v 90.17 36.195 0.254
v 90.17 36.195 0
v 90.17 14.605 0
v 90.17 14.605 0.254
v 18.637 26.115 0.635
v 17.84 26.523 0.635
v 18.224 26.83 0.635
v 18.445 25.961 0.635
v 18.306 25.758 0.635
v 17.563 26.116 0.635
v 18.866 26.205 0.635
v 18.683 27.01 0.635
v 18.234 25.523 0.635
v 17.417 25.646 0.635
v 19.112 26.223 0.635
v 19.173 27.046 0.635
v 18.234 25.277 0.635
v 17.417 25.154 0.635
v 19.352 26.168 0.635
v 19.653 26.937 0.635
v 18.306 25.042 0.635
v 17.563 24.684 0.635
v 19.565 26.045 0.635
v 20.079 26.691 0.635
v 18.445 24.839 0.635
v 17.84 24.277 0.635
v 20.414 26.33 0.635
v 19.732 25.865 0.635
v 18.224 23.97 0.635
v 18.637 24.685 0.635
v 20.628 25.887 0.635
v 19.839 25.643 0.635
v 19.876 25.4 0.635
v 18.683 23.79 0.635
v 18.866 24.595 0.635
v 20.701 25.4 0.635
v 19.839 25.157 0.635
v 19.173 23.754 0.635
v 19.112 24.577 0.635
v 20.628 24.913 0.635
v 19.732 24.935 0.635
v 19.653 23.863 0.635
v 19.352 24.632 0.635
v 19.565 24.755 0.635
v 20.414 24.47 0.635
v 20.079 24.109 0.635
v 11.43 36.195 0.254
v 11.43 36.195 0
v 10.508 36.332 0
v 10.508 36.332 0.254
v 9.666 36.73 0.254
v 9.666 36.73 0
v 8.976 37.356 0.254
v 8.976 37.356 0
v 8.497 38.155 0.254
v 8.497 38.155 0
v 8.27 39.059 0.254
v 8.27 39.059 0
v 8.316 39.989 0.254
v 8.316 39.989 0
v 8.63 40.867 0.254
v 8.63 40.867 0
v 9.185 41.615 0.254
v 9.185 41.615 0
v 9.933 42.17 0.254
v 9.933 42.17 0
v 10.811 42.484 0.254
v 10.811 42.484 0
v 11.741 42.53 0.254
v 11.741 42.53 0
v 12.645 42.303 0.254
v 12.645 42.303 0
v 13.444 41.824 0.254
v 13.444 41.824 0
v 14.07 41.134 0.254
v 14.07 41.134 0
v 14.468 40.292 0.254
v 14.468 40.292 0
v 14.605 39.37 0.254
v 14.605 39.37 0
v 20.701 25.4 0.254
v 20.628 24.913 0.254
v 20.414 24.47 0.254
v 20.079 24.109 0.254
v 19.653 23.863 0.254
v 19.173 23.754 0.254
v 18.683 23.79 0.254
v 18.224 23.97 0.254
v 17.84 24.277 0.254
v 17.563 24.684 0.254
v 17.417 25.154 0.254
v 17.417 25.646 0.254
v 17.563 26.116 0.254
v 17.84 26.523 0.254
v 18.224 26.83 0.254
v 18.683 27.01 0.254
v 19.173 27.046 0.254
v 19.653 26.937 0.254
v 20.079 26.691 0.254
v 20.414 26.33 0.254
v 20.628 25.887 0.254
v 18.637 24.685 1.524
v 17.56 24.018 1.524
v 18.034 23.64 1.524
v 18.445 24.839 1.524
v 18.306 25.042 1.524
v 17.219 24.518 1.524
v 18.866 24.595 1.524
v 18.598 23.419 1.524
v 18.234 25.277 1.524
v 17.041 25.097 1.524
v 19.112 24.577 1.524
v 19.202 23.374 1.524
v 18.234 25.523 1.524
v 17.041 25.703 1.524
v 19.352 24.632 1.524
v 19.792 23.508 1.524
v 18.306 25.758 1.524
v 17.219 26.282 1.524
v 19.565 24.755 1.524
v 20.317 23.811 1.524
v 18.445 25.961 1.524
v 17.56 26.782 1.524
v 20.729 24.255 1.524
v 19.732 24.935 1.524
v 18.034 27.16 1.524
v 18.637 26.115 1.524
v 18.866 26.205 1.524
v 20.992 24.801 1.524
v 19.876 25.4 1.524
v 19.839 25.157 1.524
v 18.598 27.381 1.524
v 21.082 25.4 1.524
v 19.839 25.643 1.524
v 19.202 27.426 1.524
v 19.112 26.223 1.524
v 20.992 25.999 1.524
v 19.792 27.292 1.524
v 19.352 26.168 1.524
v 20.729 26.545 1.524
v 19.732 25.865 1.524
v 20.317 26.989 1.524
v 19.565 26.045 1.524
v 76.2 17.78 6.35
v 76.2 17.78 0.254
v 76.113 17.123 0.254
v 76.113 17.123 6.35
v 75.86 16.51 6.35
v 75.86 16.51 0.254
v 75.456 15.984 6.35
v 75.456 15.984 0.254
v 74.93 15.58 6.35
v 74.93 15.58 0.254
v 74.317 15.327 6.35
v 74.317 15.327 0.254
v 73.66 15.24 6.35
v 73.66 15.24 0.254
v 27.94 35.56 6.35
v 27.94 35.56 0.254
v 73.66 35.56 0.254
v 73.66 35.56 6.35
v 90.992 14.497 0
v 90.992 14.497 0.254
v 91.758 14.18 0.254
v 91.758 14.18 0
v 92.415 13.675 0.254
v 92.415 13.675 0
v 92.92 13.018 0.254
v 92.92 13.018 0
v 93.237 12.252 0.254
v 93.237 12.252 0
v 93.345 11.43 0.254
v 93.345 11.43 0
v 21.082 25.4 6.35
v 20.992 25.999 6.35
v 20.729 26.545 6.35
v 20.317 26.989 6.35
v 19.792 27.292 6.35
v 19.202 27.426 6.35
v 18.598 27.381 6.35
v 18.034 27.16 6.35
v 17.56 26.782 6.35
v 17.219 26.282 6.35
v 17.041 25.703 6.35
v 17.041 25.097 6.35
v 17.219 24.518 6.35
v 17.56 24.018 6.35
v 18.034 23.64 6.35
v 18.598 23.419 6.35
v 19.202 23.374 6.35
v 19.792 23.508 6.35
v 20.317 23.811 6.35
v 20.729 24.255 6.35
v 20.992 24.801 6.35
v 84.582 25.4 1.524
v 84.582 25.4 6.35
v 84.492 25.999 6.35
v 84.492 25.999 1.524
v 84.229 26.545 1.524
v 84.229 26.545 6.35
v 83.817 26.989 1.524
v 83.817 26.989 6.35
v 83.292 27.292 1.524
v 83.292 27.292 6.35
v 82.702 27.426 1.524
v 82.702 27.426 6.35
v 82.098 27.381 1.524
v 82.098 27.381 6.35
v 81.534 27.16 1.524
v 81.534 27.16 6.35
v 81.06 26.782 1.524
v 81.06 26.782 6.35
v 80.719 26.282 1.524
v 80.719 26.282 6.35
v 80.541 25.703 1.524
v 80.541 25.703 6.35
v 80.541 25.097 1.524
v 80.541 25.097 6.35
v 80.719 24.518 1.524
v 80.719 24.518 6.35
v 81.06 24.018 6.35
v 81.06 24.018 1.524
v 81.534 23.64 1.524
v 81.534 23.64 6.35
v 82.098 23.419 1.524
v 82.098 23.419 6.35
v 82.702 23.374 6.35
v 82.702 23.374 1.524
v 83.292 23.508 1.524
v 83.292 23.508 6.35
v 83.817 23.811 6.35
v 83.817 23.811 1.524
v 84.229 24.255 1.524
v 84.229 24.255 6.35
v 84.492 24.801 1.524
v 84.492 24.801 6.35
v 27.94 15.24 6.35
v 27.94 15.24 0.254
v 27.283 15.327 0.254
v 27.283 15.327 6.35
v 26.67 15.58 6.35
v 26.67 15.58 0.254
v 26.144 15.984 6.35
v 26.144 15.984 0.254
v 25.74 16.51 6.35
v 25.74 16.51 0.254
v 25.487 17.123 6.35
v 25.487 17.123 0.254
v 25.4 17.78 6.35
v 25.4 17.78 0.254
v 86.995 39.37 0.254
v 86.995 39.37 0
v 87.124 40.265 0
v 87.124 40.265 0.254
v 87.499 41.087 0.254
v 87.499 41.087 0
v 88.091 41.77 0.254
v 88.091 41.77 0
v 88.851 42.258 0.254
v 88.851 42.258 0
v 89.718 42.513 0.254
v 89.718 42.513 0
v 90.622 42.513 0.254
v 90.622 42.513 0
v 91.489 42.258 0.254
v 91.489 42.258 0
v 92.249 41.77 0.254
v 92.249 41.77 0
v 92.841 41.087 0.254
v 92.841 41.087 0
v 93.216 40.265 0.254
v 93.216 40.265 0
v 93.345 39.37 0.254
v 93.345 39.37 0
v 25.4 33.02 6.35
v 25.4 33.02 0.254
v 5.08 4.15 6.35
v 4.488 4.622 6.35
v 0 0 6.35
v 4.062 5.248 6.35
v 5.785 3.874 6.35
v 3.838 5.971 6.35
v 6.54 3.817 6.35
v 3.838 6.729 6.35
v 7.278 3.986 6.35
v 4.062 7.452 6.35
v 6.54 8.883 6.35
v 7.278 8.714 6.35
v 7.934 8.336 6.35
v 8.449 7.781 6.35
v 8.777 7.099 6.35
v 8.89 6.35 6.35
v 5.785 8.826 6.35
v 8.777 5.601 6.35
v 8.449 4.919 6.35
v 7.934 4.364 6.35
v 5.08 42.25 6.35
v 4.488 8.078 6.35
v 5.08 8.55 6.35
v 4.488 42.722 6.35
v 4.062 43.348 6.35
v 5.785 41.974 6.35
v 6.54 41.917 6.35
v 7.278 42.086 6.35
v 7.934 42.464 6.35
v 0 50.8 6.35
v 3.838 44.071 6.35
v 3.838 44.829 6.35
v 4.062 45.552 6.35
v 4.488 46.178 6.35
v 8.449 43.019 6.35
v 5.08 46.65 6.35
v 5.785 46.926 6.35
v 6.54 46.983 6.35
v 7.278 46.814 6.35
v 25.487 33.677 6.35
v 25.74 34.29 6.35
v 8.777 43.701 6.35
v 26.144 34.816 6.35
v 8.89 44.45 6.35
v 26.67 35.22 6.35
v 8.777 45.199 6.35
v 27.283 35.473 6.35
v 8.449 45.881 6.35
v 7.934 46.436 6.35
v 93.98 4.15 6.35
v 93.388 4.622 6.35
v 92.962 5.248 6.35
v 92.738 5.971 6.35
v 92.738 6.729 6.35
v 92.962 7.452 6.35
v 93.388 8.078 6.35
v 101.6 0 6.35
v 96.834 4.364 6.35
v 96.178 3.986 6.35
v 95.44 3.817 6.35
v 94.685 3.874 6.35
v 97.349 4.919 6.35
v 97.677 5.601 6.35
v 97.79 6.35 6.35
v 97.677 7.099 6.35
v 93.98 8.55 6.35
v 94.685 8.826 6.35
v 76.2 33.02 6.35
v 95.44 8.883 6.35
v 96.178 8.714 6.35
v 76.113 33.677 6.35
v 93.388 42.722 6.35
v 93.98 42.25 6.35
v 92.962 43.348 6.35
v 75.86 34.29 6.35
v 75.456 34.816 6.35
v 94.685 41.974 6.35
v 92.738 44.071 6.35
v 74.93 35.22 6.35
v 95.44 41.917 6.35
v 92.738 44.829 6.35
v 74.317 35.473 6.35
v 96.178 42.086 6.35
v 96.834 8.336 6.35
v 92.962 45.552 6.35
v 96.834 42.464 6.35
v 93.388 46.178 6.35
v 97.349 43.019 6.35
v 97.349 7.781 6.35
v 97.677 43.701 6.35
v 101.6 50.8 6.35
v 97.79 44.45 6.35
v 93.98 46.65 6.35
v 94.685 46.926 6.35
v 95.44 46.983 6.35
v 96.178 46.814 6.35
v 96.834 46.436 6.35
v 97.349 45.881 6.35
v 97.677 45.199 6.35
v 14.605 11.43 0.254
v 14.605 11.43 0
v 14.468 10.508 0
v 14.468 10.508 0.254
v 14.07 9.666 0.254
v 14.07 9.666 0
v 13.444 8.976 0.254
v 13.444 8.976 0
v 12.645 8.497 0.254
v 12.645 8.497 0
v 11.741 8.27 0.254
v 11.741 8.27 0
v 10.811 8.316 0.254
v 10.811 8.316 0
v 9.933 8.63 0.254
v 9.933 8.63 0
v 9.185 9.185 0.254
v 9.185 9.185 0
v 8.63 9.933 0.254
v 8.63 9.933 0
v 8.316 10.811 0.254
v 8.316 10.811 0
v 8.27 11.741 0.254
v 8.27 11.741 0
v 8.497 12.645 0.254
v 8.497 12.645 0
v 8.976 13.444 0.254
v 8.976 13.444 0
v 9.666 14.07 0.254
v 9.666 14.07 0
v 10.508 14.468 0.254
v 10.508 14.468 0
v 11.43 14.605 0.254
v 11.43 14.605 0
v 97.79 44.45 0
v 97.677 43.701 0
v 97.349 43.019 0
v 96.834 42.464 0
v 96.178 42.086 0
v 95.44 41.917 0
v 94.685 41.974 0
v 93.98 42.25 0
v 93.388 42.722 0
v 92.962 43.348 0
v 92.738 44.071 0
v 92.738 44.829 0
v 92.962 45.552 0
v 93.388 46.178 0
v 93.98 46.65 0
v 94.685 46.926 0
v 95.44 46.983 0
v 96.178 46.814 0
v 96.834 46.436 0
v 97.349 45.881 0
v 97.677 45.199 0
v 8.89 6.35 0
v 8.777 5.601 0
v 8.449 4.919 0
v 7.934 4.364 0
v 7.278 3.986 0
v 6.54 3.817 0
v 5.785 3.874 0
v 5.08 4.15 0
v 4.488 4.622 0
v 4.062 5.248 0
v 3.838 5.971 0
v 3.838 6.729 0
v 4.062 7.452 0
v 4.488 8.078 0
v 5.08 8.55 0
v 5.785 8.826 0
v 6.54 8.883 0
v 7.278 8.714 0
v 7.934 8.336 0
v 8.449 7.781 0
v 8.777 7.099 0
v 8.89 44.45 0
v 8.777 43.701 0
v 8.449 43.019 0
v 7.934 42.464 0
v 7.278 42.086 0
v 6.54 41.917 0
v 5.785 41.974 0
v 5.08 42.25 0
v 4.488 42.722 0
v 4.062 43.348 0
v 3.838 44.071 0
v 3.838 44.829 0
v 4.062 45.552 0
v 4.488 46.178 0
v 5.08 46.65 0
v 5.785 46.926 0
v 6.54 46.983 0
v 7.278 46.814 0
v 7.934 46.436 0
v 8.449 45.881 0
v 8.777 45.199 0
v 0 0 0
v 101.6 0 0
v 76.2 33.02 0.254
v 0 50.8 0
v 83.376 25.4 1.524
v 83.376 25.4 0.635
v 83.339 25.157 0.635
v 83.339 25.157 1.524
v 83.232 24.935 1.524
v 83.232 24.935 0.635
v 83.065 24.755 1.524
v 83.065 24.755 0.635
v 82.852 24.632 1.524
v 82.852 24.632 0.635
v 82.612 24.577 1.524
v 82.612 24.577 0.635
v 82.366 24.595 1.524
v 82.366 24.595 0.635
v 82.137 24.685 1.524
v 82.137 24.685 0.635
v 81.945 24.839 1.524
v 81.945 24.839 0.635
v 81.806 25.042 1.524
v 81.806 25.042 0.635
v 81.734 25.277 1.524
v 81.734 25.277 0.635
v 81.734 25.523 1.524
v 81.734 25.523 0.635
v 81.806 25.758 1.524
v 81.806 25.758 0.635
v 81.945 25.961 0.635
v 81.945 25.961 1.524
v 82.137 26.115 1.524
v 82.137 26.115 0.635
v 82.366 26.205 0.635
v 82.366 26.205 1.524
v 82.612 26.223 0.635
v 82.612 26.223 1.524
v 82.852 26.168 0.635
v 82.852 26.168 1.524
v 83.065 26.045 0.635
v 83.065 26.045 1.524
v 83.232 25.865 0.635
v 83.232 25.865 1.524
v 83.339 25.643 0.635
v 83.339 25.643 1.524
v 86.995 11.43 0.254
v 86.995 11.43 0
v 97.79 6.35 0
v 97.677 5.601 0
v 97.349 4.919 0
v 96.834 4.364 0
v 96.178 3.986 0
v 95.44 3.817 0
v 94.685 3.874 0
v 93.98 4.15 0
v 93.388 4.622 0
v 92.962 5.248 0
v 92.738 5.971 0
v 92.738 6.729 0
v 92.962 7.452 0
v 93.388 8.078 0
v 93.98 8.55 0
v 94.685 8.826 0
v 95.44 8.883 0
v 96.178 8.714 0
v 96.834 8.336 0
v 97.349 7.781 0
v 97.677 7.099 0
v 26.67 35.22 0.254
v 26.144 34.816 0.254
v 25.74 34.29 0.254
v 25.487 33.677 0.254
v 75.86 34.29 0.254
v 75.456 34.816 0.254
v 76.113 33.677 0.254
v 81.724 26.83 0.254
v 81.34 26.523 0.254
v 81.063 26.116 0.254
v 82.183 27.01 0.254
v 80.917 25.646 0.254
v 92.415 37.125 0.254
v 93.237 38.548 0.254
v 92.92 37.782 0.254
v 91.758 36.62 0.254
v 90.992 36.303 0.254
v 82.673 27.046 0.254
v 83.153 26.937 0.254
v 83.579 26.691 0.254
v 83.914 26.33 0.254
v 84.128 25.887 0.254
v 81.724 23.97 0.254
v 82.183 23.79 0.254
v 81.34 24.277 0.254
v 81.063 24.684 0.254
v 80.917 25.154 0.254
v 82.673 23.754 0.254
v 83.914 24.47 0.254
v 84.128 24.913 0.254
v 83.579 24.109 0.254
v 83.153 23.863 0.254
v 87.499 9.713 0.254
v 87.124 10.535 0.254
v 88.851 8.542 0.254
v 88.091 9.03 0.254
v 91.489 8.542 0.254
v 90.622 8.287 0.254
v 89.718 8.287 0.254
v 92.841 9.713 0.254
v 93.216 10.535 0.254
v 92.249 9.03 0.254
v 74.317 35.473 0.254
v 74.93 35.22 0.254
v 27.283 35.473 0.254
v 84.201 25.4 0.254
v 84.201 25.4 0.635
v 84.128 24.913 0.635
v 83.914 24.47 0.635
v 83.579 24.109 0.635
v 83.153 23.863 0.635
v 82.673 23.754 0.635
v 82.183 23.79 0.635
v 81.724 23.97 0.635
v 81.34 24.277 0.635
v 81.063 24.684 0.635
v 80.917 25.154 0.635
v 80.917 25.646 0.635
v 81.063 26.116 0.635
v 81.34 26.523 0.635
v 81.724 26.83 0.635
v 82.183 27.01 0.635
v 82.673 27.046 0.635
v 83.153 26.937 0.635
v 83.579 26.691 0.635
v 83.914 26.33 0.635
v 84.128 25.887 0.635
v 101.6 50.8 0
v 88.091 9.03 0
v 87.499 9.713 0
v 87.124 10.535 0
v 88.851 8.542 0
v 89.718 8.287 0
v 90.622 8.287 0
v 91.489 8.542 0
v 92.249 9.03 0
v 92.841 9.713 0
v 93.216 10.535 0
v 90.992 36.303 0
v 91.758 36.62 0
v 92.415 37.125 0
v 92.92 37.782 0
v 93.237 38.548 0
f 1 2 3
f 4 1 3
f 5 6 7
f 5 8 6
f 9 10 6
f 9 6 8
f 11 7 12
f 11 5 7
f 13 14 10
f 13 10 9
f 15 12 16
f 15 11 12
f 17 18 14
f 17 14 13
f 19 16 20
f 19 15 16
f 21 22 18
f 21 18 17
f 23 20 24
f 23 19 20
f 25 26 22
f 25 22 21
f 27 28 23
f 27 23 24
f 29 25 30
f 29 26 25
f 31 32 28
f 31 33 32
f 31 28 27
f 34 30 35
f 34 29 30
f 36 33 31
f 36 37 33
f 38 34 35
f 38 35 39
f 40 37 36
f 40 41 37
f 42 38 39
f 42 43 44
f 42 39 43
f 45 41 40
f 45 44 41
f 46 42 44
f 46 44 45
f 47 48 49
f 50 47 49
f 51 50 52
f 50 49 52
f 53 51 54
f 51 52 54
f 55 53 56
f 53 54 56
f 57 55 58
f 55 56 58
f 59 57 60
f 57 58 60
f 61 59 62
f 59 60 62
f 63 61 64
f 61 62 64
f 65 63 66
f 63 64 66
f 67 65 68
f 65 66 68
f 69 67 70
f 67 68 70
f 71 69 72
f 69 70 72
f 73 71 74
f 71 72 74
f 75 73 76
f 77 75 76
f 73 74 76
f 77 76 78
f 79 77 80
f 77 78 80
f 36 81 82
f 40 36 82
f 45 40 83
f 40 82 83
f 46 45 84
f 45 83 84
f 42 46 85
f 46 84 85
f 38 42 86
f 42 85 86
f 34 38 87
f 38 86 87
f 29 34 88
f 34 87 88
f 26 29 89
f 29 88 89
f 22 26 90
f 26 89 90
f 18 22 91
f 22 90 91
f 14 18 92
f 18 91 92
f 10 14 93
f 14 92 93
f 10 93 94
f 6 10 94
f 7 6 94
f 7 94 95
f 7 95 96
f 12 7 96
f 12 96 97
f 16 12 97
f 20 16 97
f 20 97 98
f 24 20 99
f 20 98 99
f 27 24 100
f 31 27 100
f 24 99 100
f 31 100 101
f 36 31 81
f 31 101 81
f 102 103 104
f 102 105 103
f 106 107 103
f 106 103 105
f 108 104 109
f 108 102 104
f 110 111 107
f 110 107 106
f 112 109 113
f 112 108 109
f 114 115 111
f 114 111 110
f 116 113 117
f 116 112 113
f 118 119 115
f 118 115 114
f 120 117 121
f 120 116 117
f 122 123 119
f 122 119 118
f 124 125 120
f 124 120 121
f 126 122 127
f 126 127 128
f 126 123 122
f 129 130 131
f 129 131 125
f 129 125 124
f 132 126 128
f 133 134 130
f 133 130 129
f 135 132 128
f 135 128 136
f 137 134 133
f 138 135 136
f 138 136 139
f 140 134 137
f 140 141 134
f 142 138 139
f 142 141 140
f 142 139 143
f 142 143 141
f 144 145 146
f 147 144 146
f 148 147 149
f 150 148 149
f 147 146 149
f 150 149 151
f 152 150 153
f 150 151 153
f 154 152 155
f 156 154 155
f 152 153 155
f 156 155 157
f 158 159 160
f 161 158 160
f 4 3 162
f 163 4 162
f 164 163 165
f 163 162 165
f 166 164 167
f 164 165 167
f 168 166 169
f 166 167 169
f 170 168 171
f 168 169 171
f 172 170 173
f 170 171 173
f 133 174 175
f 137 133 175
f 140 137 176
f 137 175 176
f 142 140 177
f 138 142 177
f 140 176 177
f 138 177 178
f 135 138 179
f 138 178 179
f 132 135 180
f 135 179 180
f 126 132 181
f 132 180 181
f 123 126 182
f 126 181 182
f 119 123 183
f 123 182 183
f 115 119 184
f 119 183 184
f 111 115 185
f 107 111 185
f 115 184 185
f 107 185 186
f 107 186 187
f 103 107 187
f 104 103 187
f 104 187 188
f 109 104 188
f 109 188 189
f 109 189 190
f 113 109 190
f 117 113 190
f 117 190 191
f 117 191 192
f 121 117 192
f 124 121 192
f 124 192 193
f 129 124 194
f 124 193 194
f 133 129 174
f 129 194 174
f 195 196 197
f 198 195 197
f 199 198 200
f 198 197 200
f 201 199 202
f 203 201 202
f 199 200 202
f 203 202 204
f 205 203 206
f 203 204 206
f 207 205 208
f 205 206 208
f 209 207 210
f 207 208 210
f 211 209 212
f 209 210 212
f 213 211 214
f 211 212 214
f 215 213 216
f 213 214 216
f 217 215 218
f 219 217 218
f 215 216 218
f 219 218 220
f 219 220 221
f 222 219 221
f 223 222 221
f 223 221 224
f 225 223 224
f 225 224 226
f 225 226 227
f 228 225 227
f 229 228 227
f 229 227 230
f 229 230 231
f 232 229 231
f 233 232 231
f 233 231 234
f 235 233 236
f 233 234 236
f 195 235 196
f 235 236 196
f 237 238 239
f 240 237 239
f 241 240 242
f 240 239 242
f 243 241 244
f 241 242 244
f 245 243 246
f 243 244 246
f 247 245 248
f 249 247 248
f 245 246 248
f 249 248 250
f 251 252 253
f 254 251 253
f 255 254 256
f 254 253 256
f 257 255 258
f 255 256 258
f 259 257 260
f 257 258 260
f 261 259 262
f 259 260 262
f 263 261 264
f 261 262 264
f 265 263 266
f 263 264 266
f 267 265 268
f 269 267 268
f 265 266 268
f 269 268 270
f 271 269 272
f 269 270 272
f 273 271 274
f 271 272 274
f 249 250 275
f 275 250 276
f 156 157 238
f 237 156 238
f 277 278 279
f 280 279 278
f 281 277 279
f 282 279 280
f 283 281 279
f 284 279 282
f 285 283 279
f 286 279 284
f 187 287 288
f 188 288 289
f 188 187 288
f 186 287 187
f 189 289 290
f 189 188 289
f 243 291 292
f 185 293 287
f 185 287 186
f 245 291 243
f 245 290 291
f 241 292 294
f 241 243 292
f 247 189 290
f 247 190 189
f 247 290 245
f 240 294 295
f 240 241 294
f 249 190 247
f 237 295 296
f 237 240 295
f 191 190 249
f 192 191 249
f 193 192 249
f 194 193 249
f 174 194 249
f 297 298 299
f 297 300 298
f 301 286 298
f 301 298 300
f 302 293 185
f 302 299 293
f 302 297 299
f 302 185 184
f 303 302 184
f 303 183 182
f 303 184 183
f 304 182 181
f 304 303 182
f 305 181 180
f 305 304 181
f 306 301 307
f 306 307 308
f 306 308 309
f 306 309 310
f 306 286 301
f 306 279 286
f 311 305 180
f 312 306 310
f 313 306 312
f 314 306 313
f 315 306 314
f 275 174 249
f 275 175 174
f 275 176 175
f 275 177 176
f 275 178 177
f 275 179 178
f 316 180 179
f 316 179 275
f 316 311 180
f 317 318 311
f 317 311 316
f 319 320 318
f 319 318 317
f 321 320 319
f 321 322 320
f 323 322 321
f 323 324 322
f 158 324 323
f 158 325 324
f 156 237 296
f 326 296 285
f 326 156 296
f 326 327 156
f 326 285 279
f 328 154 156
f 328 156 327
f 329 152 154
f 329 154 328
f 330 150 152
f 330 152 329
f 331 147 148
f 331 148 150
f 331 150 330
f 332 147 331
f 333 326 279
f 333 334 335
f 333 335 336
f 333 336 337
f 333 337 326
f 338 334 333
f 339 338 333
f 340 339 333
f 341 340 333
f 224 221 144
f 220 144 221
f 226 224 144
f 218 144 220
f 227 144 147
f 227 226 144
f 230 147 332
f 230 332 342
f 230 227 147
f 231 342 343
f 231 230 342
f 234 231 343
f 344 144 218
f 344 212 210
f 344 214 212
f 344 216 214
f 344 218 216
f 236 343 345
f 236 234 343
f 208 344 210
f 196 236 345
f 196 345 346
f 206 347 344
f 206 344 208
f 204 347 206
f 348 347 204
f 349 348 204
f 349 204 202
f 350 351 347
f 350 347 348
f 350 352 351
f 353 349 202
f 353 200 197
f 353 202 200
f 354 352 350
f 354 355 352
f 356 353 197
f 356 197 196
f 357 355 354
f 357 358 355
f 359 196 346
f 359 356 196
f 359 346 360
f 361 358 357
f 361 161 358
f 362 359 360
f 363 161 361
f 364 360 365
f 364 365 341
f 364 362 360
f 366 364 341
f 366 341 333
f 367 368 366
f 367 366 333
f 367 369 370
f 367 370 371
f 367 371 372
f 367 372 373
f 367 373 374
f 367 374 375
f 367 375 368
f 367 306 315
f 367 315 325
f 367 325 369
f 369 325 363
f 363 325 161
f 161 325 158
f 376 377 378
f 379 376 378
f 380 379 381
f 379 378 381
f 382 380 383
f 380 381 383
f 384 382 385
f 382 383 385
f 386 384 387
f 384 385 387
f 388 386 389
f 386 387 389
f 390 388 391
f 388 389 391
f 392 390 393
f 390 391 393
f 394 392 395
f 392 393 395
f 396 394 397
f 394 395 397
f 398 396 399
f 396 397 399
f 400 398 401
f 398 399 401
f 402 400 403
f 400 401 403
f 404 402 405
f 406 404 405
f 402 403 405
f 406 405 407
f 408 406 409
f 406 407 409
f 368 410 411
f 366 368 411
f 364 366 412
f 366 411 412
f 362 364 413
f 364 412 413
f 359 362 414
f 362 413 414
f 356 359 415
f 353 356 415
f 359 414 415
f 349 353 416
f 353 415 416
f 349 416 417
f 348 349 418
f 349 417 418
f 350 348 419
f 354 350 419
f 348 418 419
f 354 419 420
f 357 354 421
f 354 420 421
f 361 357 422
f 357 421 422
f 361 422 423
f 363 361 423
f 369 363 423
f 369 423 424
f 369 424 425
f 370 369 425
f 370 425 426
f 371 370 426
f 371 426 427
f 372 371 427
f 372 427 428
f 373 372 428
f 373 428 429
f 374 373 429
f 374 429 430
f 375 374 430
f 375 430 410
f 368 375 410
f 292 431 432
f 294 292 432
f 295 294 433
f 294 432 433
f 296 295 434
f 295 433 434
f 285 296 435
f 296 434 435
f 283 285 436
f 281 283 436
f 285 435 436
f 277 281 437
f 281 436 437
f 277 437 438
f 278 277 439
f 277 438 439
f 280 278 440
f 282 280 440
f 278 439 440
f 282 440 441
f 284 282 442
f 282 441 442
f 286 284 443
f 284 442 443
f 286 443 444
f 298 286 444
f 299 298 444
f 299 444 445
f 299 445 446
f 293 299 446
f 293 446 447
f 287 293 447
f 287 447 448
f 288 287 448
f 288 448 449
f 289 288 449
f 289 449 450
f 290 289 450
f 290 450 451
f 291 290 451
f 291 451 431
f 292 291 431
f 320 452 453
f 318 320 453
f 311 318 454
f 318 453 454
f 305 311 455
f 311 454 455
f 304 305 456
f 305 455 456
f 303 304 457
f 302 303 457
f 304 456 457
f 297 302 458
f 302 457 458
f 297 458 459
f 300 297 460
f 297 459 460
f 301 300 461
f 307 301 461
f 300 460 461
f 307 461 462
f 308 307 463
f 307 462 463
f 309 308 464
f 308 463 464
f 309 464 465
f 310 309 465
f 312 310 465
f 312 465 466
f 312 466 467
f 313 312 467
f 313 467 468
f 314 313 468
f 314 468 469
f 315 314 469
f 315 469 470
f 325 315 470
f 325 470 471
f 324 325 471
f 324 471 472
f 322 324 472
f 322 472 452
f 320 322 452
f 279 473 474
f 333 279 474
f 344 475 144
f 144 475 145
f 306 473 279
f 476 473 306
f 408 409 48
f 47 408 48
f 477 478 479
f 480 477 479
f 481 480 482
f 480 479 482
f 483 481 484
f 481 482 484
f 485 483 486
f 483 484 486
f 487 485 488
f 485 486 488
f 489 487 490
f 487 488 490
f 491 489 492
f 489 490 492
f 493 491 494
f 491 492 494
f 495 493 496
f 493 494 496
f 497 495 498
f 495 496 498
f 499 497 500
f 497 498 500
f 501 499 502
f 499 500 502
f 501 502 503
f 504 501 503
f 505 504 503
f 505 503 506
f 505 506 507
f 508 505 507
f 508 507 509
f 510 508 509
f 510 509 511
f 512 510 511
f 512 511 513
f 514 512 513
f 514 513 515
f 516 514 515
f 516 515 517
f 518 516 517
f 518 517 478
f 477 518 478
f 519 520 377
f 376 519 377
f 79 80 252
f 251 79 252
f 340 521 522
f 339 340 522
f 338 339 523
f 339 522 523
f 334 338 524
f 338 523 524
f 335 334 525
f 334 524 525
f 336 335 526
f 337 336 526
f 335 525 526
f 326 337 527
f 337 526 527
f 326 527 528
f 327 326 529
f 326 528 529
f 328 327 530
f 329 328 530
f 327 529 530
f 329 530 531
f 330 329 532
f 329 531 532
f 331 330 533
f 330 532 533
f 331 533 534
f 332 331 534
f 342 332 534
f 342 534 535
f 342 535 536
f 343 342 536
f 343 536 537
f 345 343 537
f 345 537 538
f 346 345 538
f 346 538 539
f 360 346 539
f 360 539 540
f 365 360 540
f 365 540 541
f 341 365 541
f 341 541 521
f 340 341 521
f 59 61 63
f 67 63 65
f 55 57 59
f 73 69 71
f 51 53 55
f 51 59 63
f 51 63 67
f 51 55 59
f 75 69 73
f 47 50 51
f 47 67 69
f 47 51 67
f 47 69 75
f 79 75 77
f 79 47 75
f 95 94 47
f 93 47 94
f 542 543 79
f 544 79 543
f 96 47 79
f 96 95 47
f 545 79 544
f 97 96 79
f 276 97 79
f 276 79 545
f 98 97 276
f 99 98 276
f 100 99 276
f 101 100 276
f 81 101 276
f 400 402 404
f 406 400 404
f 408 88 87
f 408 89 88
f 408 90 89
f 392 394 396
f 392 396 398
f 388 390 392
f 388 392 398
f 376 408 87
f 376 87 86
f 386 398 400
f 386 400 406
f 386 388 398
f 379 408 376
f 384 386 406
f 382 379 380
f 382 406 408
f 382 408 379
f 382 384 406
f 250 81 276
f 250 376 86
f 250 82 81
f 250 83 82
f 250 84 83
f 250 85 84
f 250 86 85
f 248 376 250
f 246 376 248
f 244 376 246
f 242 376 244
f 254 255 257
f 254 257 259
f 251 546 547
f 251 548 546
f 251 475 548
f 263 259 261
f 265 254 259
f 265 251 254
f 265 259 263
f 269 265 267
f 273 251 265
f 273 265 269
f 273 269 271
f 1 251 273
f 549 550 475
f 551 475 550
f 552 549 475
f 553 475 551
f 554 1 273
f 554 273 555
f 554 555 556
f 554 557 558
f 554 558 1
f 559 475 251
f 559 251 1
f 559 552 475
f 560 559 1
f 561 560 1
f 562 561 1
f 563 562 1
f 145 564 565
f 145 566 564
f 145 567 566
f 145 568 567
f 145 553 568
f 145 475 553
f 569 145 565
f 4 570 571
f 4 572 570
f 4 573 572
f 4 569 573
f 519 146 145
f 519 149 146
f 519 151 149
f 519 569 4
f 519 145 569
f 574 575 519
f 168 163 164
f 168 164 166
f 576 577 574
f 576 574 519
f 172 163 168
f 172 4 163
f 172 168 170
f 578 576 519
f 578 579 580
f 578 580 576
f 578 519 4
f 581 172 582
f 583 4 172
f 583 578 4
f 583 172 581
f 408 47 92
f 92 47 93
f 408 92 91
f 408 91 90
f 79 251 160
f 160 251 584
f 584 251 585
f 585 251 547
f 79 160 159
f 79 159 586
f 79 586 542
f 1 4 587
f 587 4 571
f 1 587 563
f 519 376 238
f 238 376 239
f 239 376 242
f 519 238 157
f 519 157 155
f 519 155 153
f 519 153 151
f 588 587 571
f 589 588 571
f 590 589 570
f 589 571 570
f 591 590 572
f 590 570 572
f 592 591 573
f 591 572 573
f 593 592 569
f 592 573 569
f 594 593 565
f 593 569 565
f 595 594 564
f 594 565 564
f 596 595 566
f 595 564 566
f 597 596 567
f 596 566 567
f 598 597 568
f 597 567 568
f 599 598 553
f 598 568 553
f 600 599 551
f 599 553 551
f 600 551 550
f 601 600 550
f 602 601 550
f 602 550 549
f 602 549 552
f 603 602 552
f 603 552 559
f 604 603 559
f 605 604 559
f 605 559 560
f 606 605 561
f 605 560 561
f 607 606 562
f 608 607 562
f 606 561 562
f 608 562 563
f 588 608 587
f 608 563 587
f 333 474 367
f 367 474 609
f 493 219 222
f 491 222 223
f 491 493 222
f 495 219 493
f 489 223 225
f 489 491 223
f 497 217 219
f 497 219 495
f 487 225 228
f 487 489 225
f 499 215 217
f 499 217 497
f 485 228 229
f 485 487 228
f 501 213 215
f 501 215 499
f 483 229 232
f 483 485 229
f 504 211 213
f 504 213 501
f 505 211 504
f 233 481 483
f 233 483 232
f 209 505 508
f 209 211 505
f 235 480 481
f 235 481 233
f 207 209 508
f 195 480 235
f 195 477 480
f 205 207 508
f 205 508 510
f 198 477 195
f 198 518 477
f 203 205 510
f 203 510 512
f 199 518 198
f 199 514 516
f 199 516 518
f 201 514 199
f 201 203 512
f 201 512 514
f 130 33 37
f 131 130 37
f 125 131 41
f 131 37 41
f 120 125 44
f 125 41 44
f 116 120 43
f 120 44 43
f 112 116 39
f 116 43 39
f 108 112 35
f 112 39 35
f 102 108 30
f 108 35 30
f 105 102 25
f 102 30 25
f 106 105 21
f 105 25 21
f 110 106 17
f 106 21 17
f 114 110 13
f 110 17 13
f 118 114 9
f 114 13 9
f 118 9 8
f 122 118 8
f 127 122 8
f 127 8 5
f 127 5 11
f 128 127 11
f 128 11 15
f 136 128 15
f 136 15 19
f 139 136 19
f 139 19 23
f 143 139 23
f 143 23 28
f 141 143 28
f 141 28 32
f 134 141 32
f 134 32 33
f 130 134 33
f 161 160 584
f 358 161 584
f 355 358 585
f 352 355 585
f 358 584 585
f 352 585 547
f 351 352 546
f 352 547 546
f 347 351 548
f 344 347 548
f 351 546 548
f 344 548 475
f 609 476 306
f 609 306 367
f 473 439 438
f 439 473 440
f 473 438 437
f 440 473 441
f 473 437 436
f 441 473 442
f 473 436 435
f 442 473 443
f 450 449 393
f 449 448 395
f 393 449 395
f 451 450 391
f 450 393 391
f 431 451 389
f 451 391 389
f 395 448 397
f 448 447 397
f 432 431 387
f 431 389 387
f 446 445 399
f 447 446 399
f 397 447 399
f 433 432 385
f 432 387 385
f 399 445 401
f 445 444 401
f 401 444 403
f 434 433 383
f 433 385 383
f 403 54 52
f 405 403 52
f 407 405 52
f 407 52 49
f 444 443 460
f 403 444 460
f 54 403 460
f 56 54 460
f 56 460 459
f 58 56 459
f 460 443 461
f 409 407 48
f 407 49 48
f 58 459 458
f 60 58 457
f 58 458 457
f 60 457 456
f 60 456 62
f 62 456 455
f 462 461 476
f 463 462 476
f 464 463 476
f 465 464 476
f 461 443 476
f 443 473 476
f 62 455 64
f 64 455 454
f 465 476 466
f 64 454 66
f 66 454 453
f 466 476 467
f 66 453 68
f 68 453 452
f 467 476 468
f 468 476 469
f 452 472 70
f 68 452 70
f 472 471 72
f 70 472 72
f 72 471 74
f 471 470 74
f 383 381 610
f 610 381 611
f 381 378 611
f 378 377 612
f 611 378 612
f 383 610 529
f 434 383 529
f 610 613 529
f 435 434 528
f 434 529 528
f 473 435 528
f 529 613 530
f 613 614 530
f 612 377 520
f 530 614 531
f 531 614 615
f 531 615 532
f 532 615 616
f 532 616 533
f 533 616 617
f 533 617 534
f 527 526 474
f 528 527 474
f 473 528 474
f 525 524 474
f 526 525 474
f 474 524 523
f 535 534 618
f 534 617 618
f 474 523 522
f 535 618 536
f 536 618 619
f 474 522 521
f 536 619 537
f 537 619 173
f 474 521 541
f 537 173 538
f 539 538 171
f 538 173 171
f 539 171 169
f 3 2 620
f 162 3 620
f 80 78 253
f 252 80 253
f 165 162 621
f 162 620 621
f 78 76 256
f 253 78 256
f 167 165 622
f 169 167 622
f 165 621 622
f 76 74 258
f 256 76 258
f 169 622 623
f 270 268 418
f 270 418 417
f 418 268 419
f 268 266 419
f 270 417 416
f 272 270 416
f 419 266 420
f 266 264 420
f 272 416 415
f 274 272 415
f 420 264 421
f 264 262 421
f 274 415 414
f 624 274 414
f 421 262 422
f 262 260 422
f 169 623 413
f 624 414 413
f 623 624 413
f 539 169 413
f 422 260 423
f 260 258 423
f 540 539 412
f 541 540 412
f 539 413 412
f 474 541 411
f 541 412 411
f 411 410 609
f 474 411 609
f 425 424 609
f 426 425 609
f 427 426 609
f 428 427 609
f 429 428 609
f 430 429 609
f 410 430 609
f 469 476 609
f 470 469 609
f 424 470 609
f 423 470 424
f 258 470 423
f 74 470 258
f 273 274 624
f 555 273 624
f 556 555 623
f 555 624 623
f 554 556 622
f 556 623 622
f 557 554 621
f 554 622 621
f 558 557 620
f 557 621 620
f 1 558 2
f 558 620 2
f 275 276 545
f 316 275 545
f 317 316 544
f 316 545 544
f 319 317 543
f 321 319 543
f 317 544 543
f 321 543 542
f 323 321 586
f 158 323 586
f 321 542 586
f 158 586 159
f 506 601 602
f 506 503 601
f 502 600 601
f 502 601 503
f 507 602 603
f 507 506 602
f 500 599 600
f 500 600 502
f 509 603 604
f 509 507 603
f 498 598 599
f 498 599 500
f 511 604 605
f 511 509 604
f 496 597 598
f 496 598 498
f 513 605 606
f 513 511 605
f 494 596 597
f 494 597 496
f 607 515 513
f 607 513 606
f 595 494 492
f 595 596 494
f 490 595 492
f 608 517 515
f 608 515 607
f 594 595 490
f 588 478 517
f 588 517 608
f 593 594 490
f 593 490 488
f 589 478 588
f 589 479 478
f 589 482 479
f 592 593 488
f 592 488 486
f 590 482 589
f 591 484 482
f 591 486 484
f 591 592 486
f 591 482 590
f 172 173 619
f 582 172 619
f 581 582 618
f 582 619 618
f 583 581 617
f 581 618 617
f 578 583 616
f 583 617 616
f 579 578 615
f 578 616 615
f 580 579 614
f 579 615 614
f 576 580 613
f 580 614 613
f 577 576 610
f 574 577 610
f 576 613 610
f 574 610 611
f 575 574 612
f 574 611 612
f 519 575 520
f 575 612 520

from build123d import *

# Parameters (mm, degrees)
F0_W           = 101.6
F0_H           = 50.8
F1_DEPTH       = 6.35
F3_DEPTH       = 0.254
F5_DEPTH       = 25.4
F5_DEPTH_BACK  = 25.4
F6_R           = 1.651
F7_DEPTH       = 0.381
F8_R           = 2.032
F9_DEPTH       = 4.826
F10_R          = 0.8255
F11_DEPTH      = 25.4
F11_DEPTH_BACK = 5.716
F12_R          = 2.54
F13_DEPTH      = 6.351


with BuildPart() as f1:
    # F0 (on Top) → F1 (new body)
    with BuildSketch(Plane.XY):
        with Locations((50.8, 25.4)):
            Rectangle(F0_W, F0_H)
    extrude(amount=F1_DEPTH)

    # F2 (on face) → F3 (cut)
    with BuildSketch(Plane(origin=(0, 0, 0), x_dir=(1, 0, 0), z_dir=(0, 0, -1))):
        with BuildLine():
            Line((11.43, -14.605), (11.43, -11.43))
            Line((11.43, -11.43), (14.605, -11.43))
            ThreePointArc((14.605, -11.43), (9.1849359697, -9.1849359697), (11.43, -14.605))
        make_face()
        with BuildLine():
            Line((14.605, -11.43), (11.43, -11.43))
            Line((11.43, -11.43), (11.43, -14.605))
            ThreePointArc((11.43, -14.605), (13.6750640303, -13.6750640303), (14.605, -11.43))
        make_face()
        with BuildLine():
            Line((86.995, -11.43), (14.605, -11.43))
            ThreePointArc((14.605, -11.43), (13.6750640303, -13.6750640303), (11.43, -14.605))
            Line((11.43, -14.605), (11.43, -36.195))
            ThreePointArc((11.43, -36.195), (13.6750640303, -37.1249359697), (14.605, -39.37))
            Line((14.605, -39.37), (86.995, -39.37))
            ThreePointArc((86.995, -39.37), (87.9249359697, -37.1249359697), (90.17, -36.195))
            Line((90.17, -36.195), (90.17, -14.605))
            ThreePointArc((90.17, -14.605), (87.9249359697, -13.6750640303), (86.995, -11.43))
        make_face()
        with BuildLine():
            ThreePointArc((93.345, -11.43), (90.17, -8.255), (86.995, -11.43))
            Line((86.995, -11.43), (90.17, -11.43))
            Line((90.17, -11.43), (90.17, -14.605))
            ThreePointArc((90.17, -14.605), (92.4150640303, -13.6750640303), (93.345, -11.43))
        make_face()
        with BuildLine():
            Line((90.17, -11.43), (86.995, -11.43))
            ThreePointArc((86.995, -11.43), (87.9249359697, -13.6750640303), (90.17, -14.605))
            Line((90.17, -14.605), (90.17, -11.43))
        make_face()
        with BuildLine():
            ThreePointArc((14.605, -39.37), (13.6750640303, -37.1249359697), (11.43, -36.195))
            Line((11.43, -36.195), (11.43, -39.37))
            Line((11.43, -39.37), (14.605, -39.37))
        make_face()
        with BuildLine():
            Line((11.43, -39.37), (11.43, -36.195))
            ThreePointArc((11.43, -36.195), (9.1849359697, -41.6150640303), (14.605, -39.37))
            Line((14.605, -39.37), (11.43, -39.37))
        make_face()
        with BuildLine():
            ThreePointArc((93.345, -39.37), (92.4150640303, -37.1249359697), (90.17, -36.195))
            Line((90.17, -36.195), (90.17, -39.37))
            Line((90.17, -39.37), (86.995, -39.37))
            ThreePointArc((86.995, -39.37), (90.17, -42.545), (93.345, -39.37))
        make_face()
        with BuildLine():
            Line((90.17, -39.37), (90.17, -36.195))
            ThreePointArc((90.17, -36.195), (87.9249359697, -37.1249359697), (86.995, -39.37))
            Line((86.995, -39.37), (90.17, -39.37))
        make_face()
    extrude(amount=-F3_DEPTH, mode=Mode.SUBTRACT)

    # F4 (on face) → F5 (cut, two sides)
    with BuildSketch(Plane(origin=(0, 0, 0.254), x_dir=(1, 0, 0), z_dir=(0, 0, -1))) as f5_sk:
        with BuildLine():
            ThreePointArc((25.4, -33.02), (26.1439487758, -34.8160512242), (27.94, -35.56))
            Line((27.94, -35.56), (73.66, -35.56))
            ThreePointArc((73.66, -35.56), (75.4560512242, -34.8160512242), (76.2, -33.02))
            Line((76.2, -33.02), (76.2, -17.78))
            ThreePointArc((76.2, -17.78), (75.4560512242, -15.9839487758), (73.66, -15.24))
            Line((73.66, -15.24), (27.94, -15.24))
            ThreePointArc((27.94, -15.24), (26.1439487758, -15.9839487758), (25.4, -17.78))
            Line((25.4, -17.78), (25.4, -33.02))
        make_face()
    extrude(amount=F5_DEPTH, mode=Mode.SUBTRACT)
    extrude(f5_sk.sketch, amount=-F5_DEPTH_BACK, mode=Mode.SUBTRACT)

    # F6 (on face) → F7 (cut)
    with BuildSketch(Plane(origin=(0, 0, 0.254), x_dir=(1, 0, 0), z_dir=(0, 0, -1))):
        with Locations((82.55, -25.4)):
            Circle(F6_R)
        with Locations((19.05, -25.4)):
            Circle(F6_R)
    extrude(amount=-F7_DEPTH, mode=Mode.SUBTRACT)

    # F8 (on face) → F9 (cut)
    with BuildSketch(Plane.XY.offset(6.35)):
        with Locations((19.05, 25.4)):
            Circle(F8_R)
        with Locations((82.55, 25.4)):
            Circle(F8_R)
    extrude(amount=-F9_DEPTH, mode=Mode.SUBTRACT)

    # F10 (on face) → F11 (cut, two sides)
    with BuildSketch(Plane(origin=(0, 0, 0.635), x_dir=(1, 0, 0), z_dir=(0, 0, -1))) as f11_sk:
        with Locations((19.05, -25.4)):
            Circle(F10_R)
        with Locations((82.55, -25.4)):
            Circle(F10_R)
    extrude(amount=F11_DEPTH, mode=Mode.SUBTRACT)
    extrude(f11_sk.sketch, amount=-F11_DEPTH_BACK, mode=Mode.SUBTRACT)

    # F12 (on face) → F13 (cut, through all)
    with BuildSketch(Plane(origin=(0, 0, 0), x_dir=(1, 0, 0), z_dir=(0, 0, -1))):
        with Locations((95.25, -6.35)):
            Circle(F12_R)
        with Locations((6.35, -6.35)):
            Circle(F12_R)
        with Locations((6.35, -44.45)):
            Circle(F12_R)
        with Locations((95.25, -44.45)):
            Circle(F12_R)
    extrude(amount=-F13_DEPTH, mode=Mode.SUBTRACT)


solid = f1.part
